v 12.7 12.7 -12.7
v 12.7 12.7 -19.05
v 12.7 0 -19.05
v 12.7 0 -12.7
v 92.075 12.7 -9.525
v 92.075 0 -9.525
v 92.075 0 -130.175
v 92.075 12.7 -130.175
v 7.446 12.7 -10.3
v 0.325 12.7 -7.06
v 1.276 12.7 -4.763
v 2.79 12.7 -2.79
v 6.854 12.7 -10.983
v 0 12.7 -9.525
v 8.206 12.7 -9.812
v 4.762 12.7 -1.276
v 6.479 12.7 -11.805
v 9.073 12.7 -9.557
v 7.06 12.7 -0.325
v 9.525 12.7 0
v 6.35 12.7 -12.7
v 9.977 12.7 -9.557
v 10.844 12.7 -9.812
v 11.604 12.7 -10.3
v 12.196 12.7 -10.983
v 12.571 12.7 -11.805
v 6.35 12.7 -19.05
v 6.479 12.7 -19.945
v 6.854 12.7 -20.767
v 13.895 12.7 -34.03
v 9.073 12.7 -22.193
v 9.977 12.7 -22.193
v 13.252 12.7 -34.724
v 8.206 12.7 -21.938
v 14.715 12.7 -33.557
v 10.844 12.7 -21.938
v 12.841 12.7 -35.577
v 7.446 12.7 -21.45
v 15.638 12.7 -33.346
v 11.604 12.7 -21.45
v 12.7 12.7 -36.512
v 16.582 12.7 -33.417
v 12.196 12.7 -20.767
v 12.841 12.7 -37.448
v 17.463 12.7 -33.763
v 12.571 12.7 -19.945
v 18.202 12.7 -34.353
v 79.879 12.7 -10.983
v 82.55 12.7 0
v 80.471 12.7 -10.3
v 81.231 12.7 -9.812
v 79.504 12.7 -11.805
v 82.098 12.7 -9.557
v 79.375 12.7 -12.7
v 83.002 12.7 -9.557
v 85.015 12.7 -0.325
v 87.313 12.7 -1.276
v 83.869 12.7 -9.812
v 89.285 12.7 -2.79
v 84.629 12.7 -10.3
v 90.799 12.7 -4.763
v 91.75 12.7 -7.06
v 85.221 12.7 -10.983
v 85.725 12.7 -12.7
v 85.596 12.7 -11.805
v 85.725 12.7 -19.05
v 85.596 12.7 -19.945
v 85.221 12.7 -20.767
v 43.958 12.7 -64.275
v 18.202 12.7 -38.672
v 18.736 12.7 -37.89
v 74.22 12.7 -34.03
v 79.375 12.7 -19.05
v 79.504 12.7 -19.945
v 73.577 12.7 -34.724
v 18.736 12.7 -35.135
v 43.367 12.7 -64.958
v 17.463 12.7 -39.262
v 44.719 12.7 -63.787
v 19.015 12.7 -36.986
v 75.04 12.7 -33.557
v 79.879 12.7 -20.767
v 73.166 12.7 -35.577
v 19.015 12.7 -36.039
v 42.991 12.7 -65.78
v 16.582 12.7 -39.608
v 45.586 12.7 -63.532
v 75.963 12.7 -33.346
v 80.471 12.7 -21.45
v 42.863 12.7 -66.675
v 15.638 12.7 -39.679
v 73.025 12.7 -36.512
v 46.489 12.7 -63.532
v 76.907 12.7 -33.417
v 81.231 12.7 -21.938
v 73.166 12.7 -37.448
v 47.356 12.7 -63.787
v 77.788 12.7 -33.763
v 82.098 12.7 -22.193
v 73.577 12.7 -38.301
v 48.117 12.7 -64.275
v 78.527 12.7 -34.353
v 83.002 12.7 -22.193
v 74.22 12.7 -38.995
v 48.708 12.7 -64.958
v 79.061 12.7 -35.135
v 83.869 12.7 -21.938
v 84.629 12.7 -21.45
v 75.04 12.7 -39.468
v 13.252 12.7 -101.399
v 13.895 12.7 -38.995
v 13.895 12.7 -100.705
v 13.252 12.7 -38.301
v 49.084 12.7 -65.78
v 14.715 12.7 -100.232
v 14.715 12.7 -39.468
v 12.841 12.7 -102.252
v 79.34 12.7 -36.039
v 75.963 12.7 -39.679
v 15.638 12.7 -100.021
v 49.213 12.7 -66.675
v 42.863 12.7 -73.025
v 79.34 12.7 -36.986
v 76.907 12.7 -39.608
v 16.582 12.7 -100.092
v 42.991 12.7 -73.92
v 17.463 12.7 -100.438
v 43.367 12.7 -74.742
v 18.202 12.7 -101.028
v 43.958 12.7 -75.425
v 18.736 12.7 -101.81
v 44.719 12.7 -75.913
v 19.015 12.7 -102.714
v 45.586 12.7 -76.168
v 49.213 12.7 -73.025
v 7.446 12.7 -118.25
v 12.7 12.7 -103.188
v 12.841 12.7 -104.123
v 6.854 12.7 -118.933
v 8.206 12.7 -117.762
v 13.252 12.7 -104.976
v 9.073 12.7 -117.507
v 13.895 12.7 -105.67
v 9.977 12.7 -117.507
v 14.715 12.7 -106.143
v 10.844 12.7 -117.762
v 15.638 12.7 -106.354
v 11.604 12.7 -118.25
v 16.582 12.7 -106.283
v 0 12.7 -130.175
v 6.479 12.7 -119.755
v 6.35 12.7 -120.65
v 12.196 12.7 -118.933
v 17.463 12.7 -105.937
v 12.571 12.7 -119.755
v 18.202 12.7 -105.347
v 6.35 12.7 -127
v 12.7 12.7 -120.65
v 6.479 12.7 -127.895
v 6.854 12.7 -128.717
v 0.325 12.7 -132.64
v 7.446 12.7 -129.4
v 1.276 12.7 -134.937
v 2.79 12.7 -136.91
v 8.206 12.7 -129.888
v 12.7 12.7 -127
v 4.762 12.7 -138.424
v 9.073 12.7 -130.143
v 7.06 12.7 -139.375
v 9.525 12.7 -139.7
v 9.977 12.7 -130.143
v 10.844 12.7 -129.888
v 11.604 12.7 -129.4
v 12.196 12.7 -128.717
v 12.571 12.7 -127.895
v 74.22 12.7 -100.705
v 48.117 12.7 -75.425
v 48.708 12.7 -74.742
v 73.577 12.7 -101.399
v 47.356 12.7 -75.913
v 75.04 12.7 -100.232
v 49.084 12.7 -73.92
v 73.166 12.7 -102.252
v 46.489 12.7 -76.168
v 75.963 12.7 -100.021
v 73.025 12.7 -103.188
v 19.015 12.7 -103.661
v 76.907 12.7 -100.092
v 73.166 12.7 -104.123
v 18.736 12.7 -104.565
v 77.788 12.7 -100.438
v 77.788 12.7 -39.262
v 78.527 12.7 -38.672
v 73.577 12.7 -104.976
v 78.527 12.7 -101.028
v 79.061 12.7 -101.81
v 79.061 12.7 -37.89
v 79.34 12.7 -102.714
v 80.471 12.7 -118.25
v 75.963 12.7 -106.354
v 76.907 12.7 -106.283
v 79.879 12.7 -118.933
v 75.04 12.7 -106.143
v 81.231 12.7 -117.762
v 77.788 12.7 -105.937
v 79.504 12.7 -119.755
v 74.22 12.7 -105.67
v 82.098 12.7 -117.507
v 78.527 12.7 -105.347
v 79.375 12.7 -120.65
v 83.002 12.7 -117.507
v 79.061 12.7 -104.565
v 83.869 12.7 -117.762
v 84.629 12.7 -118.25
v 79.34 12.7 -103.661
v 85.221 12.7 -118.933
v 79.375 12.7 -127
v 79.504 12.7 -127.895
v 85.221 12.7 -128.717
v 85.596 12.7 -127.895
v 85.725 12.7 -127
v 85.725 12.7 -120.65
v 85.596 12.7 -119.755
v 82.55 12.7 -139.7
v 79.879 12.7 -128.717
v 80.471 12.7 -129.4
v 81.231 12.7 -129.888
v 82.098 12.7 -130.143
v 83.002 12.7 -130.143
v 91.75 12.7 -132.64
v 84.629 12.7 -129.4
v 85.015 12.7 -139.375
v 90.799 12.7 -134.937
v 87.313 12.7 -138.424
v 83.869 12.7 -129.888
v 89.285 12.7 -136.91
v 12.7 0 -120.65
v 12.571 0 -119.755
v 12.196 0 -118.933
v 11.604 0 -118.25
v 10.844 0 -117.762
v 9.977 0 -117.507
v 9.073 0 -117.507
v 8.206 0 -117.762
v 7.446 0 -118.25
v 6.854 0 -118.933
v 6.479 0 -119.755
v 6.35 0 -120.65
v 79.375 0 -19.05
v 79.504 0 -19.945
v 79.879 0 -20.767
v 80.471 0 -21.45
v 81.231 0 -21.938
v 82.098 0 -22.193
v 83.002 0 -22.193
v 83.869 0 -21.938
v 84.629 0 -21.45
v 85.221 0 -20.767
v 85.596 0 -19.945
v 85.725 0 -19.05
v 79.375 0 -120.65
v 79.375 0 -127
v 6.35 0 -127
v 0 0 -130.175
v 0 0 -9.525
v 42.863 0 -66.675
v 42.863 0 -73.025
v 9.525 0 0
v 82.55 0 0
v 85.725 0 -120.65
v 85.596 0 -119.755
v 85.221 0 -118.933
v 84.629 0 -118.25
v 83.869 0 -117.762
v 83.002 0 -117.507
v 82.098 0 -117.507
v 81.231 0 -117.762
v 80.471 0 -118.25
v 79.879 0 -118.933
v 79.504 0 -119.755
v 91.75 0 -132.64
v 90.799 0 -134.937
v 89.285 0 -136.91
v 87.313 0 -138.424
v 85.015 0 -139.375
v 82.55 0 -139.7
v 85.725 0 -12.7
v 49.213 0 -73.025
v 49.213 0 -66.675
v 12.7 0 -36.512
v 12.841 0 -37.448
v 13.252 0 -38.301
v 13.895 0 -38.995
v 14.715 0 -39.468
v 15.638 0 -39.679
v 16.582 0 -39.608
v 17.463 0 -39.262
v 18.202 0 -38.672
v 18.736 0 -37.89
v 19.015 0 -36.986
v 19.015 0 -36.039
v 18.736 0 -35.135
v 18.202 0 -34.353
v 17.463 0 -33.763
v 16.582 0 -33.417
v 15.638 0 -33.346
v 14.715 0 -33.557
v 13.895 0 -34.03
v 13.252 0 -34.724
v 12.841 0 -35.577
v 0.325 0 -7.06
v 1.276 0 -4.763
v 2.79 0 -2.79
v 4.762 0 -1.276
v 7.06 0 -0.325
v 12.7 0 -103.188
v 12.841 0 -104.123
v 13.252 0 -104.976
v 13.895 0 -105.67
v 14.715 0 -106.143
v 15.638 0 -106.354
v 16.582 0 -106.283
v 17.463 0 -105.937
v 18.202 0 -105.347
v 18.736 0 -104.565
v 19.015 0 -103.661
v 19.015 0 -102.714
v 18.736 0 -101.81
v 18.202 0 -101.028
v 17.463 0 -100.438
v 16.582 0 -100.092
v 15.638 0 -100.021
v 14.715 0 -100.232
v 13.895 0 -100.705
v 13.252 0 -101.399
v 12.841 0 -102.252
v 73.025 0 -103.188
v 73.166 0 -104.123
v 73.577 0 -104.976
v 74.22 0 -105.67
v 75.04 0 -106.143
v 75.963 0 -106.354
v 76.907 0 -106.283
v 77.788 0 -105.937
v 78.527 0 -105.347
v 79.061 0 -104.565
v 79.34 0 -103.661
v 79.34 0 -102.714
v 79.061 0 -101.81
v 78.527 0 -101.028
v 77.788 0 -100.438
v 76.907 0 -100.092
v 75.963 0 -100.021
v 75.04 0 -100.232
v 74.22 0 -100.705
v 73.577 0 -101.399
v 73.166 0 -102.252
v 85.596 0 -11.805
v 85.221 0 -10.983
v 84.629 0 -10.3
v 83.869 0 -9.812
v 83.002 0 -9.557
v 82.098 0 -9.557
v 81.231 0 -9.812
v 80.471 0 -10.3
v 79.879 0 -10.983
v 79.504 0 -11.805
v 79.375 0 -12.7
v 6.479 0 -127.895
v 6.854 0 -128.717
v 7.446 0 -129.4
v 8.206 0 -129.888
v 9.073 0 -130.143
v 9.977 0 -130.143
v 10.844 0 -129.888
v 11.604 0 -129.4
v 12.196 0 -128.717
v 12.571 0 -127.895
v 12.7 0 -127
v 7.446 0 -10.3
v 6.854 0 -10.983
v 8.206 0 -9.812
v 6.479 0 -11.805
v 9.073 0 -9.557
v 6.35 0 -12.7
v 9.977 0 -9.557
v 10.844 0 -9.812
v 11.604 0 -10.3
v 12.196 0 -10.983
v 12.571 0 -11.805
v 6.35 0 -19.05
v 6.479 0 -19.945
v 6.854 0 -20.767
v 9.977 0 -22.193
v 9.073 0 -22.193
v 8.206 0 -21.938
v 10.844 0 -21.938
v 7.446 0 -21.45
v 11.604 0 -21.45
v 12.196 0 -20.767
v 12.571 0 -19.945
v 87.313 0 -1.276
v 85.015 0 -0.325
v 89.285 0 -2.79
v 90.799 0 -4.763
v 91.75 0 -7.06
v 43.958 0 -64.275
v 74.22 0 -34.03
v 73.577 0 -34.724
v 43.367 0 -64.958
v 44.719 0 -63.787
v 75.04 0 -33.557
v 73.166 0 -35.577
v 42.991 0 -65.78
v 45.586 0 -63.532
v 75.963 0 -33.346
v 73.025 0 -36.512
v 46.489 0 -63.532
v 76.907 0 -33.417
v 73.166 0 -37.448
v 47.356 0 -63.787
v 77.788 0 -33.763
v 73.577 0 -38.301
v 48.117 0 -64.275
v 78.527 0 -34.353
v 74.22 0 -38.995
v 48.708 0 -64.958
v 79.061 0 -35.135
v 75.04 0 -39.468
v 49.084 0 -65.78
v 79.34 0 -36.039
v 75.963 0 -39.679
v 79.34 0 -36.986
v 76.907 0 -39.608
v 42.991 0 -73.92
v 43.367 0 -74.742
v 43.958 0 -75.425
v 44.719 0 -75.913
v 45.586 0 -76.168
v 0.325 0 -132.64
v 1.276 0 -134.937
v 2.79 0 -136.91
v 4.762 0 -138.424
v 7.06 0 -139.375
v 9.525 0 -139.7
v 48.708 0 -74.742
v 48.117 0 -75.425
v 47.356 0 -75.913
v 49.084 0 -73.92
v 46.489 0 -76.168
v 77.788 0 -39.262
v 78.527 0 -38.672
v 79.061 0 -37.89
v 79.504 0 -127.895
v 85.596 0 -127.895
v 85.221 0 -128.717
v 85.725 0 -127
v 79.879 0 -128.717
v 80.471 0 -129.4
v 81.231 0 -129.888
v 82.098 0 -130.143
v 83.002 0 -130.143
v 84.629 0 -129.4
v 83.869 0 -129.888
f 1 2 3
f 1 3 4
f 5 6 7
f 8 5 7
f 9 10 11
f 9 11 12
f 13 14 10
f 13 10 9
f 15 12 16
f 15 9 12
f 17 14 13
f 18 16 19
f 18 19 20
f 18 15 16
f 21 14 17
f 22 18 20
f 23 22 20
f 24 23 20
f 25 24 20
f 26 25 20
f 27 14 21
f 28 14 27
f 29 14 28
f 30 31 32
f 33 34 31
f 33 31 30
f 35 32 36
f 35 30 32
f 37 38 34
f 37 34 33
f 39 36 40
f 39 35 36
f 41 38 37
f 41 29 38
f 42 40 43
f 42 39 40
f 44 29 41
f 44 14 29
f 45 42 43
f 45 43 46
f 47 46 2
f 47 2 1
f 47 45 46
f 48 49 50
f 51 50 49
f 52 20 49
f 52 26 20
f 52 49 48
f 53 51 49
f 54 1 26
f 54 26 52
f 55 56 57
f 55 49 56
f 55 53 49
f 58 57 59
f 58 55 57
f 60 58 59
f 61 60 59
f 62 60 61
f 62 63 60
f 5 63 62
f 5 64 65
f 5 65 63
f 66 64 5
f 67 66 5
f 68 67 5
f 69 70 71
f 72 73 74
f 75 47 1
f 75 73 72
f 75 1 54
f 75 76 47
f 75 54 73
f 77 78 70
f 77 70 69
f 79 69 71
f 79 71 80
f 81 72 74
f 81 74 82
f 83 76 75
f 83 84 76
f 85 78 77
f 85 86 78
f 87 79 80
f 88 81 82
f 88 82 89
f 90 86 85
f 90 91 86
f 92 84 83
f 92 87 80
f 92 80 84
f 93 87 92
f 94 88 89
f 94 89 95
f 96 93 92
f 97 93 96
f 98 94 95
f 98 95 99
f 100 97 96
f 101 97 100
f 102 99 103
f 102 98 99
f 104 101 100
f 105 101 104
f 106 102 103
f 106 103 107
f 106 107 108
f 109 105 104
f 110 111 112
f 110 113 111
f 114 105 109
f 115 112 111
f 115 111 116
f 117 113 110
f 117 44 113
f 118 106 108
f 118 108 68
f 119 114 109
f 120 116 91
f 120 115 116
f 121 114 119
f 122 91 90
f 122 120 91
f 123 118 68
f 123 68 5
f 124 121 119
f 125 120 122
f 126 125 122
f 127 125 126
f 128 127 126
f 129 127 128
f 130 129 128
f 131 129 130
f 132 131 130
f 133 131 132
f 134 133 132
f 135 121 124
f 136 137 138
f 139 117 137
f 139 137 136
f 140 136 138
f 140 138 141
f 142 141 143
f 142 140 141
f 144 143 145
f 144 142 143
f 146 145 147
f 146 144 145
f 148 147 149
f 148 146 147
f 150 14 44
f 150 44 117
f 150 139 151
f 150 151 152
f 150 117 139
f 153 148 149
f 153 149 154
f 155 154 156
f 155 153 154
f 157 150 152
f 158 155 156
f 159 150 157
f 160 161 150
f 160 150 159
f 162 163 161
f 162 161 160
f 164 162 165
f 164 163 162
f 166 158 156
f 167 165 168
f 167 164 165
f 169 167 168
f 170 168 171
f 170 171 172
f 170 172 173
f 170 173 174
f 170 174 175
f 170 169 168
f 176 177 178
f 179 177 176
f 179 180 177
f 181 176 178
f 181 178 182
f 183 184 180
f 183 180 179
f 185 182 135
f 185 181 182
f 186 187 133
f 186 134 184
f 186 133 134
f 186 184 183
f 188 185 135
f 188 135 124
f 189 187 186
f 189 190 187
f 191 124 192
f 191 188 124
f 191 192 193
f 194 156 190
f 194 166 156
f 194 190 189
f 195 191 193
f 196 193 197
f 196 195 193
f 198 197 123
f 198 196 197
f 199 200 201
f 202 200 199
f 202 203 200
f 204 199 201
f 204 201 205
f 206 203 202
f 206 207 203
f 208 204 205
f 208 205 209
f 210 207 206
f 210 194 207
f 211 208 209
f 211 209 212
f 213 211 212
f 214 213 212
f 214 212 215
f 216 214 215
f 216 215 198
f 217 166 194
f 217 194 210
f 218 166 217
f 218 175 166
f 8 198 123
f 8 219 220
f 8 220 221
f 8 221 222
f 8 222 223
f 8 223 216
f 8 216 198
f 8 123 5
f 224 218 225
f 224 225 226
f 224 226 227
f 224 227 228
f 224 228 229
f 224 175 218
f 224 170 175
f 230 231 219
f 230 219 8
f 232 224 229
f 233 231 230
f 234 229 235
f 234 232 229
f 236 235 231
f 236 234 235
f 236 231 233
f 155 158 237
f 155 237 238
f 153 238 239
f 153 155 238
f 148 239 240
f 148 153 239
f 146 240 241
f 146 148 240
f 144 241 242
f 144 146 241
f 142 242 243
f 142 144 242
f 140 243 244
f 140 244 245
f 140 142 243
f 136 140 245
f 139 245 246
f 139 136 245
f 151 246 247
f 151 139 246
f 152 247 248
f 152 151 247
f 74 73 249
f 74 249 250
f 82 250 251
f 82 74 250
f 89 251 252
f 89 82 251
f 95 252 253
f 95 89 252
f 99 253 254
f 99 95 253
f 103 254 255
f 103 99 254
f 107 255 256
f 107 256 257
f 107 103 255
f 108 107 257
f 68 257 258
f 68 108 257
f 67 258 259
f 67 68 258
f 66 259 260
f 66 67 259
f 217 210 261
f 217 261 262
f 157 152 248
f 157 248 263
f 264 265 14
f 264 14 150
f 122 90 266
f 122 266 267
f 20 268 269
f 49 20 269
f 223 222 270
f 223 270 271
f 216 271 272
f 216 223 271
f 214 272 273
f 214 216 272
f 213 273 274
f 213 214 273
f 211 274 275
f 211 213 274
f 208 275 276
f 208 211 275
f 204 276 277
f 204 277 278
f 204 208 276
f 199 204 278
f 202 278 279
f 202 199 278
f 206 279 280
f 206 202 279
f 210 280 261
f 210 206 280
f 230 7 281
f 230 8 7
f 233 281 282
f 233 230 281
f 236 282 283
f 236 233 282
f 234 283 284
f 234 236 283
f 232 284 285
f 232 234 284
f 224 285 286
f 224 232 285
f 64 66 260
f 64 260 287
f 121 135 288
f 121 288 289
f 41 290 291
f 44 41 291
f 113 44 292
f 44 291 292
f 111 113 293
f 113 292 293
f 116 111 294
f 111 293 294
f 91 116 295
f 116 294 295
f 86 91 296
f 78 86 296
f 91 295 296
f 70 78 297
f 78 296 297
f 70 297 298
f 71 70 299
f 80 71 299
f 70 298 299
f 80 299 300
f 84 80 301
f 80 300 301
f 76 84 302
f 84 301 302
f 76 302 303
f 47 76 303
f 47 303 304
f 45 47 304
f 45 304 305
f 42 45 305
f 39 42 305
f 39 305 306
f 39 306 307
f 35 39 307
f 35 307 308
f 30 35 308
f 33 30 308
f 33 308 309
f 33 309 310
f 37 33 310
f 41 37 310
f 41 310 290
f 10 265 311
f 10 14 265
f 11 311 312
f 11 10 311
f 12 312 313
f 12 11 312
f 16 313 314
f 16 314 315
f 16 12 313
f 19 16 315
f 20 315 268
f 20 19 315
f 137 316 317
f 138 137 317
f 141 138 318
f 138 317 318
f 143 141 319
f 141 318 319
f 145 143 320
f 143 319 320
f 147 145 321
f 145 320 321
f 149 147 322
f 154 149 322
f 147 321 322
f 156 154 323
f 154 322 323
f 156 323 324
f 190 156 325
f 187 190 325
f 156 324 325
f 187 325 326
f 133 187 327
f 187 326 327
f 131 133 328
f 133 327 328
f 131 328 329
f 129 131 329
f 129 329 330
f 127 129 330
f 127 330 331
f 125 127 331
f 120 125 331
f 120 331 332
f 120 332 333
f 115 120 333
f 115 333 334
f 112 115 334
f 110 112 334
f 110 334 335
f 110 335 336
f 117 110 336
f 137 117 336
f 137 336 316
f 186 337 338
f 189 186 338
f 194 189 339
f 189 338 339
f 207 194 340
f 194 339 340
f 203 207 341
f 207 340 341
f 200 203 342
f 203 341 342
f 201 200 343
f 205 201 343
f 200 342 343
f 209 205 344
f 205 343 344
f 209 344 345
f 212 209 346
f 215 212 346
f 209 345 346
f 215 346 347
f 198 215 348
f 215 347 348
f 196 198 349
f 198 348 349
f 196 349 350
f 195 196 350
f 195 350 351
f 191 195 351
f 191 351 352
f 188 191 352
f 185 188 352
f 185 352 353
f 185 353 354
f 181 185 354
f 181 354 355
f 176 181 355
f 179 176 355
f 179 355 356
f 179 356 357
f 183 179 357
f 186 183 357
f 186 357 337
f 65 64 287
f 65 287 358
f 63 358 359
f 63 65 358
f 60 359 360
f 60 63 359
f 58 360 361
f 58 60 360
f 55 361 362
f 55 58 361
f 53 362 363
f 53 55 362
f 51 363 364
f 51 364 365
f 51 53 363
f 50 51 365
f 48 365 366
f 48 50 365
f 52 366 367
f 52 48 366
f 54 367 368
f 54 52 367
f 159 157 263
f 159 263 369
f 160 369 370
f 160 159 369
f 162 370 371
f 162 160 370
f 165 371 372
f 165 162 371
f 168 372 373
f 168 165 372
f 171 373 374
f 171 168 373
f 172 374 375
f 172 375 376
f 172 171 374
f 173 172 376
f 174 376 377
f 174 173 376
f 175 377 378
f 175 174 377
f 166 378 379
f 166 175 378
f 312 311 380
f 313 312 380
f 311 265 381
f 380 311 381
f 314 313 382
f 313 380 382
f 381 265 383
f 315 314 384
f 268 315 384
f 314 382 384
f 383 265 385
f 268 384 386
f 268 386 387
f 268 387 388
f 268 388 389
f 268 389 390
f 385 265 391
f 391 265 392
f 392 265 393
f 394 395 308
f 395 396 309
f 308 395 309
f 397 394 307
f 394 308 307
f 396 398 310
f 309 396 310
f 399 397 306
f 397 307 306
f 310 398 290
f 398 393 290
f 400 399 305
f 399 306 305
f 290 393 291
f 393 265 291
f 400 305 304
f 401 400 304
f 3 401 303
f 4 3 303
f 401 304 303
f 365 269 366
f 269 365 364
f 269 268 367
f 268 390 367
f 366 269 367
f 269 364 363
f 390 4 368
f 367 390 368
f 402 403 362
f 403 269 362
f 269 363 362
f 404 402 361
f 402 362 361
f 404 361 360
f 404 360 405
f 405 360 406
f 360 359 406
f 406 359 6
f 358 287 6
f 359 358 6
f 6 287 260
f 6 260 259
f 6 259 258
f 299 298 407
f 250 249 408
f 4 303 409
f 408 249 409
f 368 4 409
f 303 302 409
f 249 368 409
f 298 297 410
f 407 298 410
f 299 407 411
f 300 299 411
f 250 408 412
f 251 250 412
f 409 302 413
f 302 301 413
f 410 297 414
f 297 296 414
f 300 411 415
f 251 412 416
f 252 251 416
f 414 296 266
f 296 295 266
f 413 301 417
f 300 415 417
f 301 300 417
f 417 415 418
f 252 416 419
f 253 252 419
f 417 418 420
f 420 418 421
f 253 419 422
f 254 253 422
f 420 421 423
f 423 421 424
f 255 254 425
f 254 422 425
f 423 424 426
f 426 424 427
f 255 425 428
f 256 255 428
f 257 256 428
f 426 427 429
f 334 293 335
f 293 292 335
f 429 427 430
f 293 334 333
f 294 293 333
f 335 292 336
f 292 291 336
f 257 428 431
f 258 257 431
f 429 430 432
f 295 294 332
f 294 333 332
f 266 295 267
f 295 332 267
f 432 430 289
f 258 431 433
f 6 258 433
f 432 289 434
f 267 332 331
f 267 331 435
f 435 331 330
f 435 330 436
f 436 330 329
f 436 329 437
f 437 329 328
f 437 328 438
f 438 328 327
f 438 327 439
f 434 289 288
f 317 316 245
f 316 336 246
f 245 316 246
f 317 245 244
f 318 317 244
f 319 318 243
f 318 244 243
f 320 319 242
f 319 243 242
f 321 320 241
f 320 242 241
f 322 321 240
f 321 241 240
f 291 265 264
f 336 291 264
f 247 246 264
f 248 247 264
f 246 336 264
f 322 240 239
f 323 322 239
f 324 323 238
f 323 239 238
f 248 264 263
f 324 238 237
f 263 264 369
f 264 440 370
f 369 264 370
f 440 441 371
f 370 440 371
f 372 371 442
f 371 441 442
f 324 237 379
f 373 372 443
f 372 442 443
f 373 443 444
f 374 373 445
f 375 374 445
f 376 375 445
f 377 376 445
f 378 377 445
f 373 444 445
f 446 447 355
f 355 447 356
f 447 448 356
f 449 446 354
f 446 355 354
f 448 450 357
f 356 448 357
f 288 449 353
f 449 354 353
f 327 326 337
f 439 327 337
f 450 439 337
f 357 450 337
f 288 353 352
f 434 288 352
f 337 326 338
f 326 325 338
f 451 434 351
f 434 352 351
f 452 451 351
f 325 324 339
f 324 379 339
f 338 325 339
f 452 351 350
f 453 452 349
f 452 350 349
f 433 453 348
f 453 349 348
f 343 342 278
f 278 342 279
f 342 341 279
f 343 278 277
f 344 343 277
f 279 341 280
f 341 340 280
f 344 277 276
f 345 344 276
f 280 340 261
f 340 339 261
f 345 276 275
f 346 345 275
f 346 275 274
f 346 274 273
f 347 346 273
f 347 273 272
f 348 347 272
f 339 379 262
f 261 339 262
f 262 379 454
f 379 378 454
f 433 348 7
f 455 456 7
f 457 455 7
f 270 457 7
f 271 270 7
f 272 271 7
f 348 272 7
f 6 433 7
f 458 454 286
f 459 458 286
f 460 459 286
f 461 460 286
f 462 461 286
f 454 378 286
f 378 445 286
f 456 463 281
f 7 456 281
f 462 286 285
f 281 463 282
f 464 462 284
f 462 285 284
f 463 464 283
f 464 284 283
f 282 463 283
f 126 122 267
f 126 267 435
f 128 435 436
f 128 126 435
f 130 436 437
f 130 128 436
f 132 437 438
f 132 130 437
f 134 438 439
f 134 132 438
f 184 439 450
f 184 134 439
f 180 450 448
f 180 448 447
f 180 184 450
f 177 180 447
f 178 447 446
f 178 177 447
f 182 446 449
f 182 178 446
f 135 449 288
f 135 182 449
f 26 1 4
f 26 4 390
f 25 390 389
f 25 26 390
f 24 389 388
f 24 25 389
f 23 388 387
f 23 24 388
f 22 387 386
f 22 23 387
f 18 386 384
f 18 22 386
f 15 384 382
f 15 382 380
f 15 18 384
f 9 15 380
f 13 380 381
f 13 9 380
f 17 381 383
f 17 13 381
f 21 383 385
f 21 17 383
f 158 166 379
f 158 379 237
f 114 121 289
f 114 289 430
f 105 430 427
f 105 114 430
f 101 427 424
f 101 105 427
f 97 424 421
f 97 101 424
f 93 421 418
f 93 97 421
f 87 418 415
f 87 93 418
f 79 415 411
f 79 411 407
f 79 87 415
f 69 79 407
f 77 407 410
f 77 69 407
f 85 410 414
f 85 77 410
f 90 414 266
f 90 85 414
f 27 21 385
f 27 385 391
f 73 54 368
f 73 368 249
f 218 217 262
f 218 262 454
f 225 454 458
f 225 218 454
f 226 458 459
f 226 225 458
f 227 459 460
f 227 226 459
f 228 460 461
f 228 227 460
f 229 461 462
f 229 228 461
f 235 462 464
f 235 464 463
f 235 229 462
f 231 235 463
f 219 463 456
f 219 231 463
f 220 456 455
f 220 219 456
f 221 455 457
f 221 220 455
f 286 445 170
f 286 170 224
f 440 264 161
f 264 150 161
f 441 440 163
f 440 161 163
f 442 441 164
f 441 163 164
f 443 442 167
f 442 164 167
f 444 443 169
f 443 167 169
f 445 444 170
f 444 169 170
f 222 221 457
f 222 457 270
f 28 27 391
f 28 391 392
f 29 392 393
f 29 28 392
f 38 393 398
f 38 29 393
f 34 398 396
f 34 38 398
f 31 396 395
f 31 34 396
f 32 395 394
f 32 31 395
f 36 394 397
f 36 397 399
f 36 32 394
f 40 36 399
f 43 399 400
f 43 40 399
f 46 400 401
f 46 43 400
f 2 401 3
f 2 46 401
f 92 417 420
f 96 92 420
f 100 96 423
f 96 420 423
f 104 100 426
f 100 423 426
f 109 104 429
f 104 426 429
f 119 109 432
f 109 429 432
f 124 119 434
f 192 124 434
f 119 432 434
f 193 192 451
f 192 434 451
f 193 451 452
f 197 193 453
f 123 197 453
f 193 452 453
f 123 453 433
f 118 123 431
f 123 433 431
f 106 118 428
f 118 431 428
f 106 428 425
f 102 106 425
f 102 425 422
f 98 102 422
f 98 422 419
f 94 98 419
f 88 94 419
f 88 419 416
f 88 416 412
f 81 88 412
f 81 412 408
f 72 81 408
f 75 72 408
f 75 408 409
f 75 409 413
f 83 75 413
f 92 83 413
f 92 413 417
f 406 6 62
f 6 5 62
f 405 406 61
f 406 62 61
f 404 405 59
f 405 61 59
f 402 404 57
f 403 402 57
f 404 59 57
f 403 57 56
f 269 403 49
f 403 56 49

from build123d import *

# Parameters (mm, degrees)
SKETCH1_W                   = 92.075
SKETCH1_H                   = 139.7
BOSS_EXTRUDE1_DEPTH         = 12.7
F_1_4_0_25_DIAMETER_HOLE1_D = 6.35
CUT_EXTRUDE1_DEPTH          = 12.7
FILLET1_R                   = 9.525


with BuildPart() as part:
    # Sketch1 → Boss-Extrude1 (new body)
    with BuildSketch(Plane(origin=(0, 0, 0), x_dir=(1, 0, 0), z_dir=(0, 1, 0))):
        with Locations((46.0375, 69.85)):
            Rectangle(SKETCH1_W, SKETCH1_H)
    extrude(amount=BOSS_EXTRUDE1_DEPTH)

    # 1/4 (0.25) Diameter Hole1 (through all)
    with Locations(Plane(origin=(0, 12.7, 0), x_dir=(1, 0, 0), z_dir=(0, 1, 0))):
        with Locations((76.2, 36.5125), (46.0375, 69.85), (76.2, 103.1875), (15.875, 36.5125), (15.875, 103.1875)):
            Hole(F_1_4_0_25_DIAMETER_HOLE1_D / 2)

    # Sketch7 → Cut-Extrude1 (cut)
    with BuildSketch(Plane(origin=(0, 12.7, 0), x_dir=(1, 0, 0), z_dir=(0, 1, 0))):
        with BuildLine():
            Line((12.7, 127), (12.7, 120.65))
            ThreePointArc((12.7, 120.65), (9.525, 117.475), (6.35, 120.65))
            Line((6.35, 120.65), (6.35, 127))
            ThreePointArc((6.35, 127), (9.525, 130.175), (12.7, 127))
        make_face()
    cut_extrude1 = extrude(amount=-CUT_EXTRUDE1_DEPTH, mode=Mode.SUBTRACT)

    # Sketch-Pattern1: Cut-Extrude1 at 4 more places
    with Locations((36.5125, 0, 53.975), (73.025, 0, 0), (73.025, 0, 107.95), (0, 0, 107.95)):
        add(cut_extrude1, mode=Mode.SUBTRACT)

    # Fillet1
    fillet1_edges = [part.edges().sort_by_distance(p)[0] for p in [
        (0, 6.35, -139.7),
        (92.075, 6.35, -139.7),
        (92.075, 6.35, 0),
        (0, 6.35, 0),
    ]]
    fillet(fillet1_edges, radius=FILLET1_R)


solid = part.part
